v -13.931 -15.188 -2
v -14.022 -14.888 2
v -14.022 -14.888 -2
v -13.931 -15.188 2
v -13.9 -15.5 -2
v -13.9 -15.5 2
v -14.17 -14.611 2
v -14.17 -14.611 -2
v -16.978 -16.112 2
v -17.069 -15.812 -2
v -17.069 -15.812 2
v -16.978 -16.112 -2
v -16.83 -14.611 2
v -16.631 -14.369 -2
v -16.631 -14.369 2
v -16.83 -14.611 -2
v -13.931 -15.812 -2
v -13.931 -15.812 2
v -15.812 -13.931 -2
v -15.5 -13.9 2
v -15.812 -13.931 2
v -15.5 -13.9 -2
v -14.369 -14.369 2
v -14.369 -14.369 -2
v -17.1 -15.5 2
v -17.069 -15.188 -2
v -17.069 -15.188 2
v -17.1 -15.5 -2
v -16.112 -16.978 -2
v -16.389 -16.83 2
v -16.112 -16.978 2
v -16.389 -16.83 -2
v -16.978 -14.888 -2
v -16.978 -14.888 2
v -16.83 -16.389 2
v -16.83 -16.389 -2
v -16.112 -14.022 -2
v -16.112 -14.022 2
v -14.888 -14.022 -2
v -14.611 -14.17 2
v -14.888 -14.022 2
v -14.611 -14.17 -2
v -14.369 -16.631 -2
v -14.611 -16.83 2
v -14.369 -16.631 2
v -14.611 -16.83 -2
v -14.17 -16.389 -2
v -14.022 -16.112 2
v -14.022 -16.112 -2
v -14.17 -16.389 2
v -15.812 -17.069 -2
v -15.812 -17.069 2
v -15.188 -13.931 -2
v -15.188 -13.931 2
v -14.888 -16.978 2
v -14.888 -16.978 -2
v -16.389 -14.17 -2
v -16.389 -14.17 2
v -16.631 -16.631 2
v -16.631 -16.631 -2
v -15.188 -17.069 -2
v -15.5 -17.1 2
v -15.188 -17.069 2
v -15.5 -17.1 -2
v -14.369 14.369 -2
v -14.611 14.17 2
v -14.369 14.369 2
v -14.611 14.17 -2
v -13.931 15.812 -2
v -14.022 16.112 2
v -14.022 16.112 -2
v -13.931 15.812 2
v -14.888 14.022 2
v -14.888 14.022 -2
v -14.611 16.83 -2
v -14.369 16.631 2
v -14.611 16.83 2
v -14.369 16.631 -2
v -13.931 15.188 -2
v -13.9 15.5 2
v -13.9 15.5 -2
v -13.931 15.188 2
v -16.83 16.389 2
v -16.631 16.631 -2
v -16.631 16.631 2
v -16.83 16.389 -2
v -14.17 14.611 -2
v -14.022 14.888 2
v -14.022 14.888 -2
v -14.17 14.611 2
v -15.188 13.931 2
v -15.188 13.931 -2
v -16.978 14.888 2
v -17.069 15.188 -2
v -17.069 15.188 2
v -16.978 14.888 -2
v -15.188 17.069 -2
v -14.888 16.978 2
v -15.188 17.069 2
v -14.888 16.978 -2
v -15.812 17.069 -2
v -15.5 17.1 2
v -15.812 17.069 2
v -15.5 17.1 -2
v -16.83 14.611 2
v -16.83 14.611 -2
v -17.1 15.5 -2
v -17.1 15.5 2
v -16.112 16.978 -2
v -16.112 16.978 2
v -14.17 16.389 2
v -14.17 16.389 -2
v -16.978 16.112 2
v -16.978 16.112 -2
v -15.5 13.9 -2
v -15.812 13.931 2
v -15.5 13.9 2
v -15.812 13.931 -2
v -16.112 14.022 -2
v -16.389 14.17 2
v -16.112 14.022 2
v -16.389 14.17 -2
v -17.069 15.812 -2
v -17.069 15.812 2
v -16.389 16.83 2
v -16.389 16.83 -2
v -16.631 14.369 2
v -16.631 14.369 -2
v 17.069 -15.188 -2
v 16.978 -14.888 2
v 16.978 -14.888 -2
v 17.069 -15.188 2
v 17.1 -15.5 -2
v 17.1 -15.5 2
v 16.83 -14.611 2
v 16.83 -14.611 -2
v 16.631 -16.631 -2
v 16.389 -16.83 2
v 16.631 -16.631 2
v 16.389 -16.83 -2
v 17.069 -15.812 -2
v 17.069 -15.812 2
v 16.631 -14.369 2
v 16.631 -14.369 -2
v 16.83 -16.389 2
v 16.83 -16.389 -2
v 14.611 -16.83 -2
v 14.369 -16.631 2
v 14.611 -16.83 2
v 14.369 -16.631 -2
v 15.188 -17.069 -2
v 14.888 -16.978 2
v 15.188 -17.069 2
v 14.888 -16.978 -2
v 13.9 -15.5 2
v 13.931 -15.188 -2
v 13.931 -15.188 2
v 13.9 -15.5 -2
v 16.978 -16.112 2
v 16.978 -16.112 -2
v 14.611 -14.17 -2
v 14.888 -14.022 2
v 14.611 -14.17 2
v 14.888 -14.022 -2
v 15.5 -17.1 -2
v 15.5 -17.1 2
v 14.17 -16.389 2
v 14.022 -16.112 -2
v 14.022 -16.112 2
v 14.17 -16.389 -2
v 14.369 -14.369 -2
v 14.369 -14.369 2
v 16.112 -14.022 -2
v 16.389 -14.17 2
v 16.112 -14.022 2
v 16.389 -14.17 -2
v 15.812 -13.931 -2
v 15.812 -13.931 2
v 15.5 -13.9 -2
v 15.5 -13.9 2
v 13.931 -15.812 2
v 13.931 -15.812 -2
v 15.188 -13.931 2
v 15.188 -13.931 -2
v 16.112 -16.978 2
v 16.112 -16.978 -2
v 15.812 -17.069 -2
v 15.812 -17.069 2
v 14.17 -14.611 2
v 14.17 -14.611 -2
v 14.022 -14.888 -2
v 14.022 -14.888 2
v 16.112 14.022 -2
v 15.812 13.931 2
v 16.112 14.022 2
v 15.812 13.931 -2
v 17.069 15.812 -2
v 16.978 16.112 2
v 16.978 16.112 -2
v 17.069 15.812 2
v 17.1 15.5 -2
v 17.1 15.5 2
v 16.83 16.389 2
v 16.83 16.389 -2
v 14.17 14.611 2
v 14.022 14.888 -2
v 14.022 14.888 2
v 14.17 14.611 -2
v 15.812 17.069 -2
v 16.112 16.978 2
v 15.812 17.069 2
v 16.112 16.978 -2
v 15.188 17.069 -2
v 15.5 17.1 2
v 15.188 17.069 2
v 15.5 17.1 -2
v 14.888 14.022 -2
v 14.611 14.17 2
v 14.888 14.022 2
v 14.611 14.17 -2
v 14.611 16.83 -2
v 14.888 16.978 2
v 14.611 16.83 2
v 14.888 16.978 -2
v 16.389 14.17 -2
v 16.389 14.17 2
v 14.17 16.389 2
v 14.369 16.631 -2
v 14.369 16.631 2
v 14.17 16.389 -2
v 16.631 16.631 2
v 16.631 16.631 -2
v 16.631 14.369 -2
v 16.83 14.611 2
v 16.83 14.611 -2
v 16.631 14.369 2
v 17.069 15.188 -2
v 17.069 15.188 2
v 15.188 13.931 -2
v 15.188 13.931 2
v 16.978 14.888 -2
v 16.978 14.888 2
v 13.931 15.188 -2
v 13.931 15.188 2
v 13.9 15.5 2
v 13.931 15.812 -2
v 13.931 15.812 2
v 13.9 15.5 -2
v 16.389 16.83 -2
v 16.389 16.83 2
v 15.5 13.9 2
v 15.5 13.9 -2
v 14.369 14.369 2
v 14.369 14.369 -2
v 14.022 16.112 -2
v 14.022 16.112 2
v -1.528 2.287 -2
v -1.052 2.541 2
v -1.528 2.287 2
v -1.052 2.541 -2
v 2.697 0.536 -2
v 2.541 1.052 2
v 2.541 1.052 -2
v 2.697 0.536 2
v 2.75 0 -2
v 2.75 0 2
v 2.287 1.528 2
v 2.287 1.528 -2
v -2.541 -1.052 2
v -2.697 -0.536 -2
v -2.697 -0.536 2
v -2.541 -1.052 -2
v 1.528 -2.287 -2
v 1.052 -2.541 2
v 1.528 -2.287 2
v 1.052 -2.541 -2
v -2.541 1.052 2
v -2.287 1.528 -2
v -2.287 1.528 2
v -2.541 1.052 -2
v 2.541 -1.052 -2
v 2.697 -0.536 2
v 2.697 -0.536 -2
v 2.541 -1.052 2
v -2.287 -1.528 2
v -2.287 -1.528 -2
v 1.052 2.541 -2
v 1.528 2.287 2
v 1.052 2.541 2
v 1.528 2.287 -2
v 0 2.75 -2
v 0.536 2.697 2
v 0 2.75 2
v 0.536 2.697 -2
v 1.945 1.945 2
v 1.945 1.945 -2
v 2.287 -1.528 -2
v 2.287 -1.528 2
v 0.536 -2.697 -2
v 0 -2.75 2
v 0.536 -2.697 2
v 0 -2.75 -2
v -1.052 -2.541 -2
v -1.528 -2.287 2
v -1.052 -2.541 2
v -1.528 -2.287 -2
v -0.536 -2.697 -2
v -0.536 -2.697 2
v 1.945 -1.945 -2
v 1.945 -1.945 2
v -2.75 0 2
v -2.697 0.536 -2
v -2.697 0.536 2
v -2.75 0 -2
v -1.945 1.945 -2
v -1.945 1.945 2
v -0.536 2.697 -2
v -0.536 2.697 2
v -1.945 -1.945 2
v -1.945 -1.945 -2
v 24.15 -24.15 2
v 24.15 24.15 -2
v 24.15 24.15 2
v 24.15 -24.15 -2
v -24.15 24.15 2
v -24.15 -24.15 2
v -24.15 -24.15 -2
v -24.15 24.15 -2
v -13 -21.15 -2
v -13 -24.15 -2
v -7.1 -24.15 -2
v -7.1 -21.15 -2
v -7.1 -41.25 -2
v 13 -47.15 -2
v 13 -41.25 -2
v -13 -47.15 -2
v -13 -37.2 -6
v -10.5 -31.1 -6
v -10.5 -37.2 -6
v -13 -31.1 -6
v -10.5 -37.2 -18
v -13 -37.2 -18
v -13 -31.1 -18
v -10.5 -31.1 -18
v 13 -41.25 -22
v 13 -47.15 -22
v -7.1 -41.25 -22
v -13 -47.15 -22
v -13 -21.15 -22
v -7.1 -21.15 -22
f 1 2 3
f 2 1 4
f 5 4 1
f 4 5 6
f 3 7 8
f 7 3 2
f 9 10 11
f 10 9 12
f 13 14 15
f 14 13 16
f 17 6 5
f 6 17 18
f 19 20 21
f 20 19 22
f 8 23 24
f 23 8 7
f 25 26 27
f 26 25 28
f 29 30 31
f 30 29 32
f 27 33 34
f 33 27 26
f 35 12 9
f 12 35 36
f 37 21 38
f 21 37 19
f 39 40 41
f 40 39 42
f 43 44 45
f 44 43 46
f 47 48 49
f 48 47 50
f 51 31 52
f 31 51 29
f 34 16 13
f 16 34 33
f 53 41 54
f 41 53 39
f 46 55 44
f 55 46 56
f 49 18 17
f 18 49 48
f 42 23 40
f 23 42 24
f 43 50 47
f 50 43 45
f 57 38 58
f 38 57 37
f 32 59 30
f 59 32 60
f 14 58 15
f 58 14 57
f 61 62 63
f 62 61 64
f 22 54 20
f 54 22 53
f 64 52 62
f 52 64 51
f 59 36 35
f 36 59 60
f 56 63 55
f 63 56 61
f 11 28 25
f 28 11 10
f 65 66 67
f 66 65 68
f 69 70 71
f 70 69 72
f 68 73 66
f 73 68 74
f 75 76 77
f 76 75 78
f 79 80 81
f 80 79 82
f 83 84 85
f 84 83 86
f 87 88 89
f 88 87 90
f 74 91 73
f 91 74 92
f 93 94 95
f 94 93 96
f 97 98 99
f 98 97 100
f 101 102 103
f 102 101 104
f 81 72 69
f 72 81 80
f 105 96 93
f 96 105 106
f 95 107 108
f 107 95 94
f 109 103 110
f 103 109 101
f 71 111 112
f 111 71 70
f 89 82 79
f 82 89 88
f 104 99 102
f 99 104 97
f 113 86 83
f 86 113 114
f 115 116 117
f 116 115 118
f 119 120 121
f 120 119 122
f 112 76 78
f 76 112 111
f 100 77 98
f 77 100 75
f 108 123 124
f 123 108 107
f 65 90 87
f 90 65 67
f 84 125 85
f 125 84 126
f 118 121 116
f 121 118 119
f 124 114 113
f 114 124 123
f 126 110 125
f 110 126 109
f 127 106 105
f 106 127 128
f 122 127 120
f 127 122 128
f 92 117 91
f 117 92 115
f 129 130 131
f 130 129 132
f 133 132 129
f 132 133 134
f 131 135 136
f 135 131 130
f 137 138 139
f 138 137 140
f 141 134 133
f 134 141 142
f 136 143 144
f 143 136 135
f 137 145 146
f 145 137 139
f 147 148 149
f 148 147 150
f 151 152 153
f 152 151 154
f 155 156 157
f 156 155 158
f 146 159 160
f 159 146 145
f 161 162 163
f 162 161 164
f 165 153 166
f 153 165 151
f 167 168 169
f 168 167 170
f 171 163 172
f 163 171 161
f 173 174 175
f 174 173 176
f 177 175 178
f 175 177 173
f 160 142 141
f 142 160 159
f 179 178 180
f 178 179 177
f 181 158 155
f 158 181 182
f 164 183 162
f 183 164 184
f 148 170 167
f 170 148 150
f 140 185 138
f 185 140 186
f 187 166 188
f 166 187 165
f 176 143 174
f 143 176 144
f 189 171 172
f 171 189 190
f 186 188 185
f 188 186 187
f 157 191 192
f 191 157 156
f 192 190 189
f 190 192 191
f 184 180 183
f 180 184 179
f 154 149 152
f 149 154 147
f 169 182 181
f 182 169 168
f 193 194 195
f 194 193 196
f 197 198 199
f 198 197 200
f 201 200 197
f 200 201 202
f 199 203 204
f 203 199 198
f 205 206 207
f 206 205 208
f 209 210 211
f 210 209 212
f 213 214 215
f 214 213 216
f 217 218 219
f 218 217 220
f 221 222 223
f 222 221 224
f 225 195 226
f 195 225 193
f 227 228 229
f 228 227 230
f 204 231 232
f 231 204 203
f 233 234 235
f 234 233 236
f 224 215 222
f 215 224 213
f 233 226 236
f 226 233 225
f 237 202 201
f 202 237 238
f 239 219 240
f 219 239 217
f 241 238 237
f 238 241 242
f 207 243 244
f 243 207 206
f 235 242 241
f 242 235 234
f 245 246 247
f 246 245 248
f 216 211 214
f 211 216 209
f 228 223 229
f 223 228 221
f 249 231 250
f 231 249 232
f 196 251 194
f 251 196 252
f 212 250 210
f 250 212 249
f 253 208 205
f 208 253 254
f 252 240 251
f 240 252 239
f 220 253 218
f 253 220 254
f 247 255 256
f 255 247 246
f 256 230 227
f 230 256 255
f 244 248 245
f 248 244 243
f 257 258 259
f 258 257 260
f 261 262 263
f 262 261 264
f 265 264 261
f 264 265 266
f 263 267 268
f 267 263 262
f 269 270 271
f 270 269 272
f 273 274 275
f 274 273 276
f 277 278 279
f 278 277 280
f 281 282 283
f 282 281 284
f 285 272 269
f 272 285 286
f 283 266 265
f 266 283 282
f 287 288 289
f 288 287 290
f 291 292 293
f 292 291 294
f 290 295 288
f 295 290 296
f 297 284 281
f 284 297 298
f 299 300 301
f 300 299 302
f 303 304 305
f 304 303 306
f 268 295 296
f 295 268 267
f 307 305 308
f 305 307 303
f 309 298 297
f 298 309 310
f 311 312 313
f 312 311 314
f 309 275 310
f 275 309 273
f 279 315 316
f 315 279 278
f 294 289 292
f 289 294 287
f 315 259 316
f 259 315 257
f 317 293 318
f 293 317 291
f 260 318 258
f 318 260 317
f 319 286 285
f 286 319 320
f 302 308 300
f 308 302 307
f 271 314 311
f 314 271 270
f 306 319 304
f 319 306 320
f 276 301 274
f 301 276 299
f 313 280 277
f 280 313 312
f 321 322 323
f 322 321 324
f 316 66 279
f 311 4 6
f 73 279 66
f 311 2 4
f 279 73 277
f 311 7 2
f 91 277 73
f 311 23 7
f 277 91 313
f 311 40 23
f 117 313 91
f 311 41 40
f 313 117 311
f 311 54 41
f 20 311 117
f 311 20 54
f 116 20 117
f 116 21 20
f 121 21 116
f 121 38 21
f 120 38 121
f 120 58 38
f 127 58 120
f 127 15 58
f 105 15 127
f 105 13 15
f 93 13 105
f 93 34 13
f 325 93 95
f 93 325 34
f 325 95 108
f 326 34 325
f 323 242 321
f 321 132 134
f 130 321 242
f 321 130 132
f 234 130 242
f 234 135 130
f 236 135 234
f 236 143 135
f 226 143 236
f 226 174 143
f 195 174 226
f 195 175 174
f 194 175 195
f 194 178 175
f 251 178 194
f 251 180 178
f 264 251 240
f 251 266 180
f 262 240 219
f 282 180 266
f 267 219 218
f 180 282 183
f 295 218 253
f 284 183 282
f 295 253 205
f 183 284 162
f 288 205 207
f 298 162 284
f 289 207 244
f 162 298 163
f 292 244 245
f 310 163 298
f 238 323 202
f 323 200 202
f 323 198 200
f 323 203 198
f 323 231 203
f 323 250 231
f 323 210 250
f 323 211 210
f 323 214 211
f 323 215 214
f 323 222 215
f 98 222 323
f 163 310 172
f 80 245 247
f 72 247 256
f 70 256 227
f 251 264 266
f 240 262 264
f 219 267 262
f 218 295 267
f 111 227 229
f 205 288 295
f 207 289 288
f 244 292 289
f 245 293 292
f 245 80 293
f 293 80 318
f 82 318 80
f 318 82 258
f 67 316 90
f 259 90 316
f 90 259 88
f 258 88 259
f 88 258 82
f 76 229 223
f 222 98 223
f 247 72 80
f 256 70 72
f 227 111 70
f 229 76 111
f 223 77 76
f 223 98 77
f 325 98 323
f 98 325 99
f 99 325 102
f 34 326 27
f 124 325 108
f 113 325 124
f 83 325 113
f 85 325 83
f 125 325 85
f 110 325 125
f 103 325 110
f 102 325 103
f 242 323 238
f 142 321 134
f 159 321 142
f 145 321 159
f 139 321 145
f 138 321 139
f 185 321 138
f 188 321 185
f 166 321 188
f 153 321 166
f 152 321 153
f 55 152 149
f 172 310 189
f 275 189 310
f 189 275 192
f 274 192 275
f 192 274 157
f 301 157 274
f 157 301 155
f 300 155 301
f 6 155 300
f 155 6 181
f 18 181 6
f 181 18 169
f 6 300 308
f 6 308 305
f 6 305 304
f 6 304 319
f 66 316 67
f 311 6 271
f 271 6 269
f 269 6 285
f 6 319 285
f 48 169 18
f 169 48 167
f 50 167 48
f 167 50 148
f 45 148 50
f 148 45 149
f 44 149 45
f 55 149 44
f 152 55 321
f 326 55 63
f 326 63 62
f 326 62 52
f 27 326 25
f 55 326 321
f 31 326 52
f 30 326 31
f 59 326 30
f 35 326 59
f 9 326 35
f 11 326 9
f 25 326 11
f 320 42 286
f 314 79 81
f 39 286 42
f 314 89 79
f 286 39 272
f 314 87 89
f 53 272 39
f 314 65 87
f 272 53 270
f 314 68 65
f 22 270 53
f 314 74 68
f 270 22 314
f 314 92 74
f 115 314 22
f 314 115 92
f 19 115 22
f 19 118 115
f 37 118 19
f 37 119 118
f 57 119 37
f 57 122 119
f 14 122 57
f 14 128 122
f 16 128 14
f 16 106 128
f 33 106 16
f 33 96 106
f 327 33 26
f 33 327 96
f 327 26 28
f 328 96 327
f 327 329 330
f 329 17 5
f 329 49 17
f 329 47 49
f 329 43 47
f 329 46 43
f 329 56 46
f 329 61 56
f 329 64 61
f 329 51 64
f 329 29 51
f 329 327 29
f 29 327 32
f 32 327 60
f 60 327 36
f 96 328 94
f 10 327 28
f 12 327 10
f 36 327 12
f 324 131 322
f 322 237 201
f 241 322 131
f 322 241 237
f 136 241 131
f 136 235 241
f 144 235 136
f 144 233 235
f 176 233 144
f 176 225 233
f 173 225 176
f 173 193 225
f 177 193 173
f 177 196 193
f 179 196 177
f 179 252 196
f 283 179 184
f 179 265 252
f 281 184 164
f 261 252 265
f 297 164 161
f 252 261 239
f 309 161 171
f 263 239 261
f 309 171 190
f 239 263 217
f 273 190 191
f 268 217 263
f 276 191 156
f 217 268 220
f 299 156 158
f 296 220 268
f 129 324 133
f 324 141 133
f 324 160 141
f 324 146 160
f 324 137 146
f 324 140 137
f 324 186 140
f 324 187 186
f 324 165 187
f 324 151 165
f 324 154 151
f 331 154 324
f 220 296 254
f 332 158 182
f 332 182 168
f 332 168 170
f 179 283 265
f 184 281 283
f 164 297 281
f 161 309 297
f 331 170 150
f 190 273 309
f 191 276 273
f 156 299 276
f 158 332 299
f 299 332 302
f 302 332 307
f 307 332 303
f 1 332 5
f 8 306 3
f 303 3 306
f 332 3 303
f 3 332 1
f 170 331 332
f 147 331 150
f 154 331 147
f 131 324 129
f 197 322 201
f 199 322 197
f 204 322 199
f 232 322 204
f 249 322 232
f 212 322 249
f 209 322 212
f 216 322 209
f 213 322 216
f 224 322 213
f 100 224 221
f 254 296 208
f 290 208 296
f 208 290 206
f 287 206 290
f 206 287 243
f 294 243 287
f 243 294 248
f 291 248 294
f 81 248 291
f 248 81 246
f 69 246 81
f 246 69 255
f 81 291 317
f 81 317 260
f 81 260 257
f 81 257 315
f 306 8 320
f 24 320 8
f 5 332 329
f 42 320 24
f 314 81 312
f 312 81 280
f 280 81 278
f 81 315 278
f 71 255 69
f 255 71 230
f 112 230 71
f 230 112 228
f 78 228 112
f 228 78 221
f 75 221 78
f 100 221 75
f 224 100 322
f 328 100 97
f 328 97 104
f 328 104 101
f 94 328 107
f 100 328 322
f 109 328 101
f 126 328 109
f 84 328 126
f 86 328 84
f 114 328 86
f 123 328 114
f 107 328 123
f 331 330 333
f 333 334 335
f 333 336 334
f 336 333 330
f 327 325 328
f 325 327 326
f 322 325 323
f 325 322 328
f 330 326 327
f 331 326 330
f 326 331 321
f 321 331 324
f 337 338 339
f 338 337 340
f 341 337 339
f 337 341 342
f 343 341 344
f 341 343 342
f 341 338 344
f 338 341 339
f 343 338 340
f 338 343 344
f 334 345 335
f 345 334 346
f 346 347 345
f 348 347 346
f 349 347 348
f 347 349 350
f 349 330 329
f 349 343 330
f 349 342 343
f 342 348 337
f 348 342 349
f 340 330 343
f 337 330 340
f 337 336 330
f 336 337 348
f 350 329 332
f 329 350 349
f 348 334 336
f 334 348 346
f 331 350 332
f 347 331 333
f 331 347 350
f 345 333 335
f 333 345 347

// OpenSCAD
// SpiderCAM Corner Motor Mount v1
// Mounts NEMA 17 at 45-degree corner of 20x20 aluminium extrusion frame

motor_w       = 42.3;
motor_h       = 42.3;
bolt_spacing  = 31.0;
motor_shaft_d = 5.5;
mount_t       = 4.0;
extrusion     = 20.0;
slot_w        = 6.1;
wall          = 3.0;

$fn = 32;

module nema17_holes() {
    cylinder(h = mount_t + 2, d = motor_shaft_d, center = true);
    for (x=[-1,1], y=[-1,1])
        translate([x*bolt_spacing/2, y*bolt_spacing/2, 0])
            cylinder(h = mount_t + 2, d = 3.2, center = true);
}

module extrusion_bracket() {
    difference() {
        cube([extrusion + wall*2, extrusion + wall*2, extrusion], center=true);
        translate([wall, wall, 0])
            cube([extrusion + 0.2, extrusion + 0.2, extrusion + 2], center=true);
        for (face=[0,1]) {
            rotate([0, 0, face*90])
                translate([0, (extrusion/2 + wall), 0])
                    cube([slot_w, wall + 2, extrusion*0.6], center=true);
        }
    }
}

module motor_mount_plate() {
    difference() {
        cube([motor_w + wall*2, motor_h + wall*2, mount_t], center=true);
        nema17_holes();
    }
}

union() {
    motor_mount_plate();
    translate([0, -(motor_h/2 + extrusion/2 + wall), -(extrusion/2 + mount_t/2)])
        extrusion_bracket();
}
